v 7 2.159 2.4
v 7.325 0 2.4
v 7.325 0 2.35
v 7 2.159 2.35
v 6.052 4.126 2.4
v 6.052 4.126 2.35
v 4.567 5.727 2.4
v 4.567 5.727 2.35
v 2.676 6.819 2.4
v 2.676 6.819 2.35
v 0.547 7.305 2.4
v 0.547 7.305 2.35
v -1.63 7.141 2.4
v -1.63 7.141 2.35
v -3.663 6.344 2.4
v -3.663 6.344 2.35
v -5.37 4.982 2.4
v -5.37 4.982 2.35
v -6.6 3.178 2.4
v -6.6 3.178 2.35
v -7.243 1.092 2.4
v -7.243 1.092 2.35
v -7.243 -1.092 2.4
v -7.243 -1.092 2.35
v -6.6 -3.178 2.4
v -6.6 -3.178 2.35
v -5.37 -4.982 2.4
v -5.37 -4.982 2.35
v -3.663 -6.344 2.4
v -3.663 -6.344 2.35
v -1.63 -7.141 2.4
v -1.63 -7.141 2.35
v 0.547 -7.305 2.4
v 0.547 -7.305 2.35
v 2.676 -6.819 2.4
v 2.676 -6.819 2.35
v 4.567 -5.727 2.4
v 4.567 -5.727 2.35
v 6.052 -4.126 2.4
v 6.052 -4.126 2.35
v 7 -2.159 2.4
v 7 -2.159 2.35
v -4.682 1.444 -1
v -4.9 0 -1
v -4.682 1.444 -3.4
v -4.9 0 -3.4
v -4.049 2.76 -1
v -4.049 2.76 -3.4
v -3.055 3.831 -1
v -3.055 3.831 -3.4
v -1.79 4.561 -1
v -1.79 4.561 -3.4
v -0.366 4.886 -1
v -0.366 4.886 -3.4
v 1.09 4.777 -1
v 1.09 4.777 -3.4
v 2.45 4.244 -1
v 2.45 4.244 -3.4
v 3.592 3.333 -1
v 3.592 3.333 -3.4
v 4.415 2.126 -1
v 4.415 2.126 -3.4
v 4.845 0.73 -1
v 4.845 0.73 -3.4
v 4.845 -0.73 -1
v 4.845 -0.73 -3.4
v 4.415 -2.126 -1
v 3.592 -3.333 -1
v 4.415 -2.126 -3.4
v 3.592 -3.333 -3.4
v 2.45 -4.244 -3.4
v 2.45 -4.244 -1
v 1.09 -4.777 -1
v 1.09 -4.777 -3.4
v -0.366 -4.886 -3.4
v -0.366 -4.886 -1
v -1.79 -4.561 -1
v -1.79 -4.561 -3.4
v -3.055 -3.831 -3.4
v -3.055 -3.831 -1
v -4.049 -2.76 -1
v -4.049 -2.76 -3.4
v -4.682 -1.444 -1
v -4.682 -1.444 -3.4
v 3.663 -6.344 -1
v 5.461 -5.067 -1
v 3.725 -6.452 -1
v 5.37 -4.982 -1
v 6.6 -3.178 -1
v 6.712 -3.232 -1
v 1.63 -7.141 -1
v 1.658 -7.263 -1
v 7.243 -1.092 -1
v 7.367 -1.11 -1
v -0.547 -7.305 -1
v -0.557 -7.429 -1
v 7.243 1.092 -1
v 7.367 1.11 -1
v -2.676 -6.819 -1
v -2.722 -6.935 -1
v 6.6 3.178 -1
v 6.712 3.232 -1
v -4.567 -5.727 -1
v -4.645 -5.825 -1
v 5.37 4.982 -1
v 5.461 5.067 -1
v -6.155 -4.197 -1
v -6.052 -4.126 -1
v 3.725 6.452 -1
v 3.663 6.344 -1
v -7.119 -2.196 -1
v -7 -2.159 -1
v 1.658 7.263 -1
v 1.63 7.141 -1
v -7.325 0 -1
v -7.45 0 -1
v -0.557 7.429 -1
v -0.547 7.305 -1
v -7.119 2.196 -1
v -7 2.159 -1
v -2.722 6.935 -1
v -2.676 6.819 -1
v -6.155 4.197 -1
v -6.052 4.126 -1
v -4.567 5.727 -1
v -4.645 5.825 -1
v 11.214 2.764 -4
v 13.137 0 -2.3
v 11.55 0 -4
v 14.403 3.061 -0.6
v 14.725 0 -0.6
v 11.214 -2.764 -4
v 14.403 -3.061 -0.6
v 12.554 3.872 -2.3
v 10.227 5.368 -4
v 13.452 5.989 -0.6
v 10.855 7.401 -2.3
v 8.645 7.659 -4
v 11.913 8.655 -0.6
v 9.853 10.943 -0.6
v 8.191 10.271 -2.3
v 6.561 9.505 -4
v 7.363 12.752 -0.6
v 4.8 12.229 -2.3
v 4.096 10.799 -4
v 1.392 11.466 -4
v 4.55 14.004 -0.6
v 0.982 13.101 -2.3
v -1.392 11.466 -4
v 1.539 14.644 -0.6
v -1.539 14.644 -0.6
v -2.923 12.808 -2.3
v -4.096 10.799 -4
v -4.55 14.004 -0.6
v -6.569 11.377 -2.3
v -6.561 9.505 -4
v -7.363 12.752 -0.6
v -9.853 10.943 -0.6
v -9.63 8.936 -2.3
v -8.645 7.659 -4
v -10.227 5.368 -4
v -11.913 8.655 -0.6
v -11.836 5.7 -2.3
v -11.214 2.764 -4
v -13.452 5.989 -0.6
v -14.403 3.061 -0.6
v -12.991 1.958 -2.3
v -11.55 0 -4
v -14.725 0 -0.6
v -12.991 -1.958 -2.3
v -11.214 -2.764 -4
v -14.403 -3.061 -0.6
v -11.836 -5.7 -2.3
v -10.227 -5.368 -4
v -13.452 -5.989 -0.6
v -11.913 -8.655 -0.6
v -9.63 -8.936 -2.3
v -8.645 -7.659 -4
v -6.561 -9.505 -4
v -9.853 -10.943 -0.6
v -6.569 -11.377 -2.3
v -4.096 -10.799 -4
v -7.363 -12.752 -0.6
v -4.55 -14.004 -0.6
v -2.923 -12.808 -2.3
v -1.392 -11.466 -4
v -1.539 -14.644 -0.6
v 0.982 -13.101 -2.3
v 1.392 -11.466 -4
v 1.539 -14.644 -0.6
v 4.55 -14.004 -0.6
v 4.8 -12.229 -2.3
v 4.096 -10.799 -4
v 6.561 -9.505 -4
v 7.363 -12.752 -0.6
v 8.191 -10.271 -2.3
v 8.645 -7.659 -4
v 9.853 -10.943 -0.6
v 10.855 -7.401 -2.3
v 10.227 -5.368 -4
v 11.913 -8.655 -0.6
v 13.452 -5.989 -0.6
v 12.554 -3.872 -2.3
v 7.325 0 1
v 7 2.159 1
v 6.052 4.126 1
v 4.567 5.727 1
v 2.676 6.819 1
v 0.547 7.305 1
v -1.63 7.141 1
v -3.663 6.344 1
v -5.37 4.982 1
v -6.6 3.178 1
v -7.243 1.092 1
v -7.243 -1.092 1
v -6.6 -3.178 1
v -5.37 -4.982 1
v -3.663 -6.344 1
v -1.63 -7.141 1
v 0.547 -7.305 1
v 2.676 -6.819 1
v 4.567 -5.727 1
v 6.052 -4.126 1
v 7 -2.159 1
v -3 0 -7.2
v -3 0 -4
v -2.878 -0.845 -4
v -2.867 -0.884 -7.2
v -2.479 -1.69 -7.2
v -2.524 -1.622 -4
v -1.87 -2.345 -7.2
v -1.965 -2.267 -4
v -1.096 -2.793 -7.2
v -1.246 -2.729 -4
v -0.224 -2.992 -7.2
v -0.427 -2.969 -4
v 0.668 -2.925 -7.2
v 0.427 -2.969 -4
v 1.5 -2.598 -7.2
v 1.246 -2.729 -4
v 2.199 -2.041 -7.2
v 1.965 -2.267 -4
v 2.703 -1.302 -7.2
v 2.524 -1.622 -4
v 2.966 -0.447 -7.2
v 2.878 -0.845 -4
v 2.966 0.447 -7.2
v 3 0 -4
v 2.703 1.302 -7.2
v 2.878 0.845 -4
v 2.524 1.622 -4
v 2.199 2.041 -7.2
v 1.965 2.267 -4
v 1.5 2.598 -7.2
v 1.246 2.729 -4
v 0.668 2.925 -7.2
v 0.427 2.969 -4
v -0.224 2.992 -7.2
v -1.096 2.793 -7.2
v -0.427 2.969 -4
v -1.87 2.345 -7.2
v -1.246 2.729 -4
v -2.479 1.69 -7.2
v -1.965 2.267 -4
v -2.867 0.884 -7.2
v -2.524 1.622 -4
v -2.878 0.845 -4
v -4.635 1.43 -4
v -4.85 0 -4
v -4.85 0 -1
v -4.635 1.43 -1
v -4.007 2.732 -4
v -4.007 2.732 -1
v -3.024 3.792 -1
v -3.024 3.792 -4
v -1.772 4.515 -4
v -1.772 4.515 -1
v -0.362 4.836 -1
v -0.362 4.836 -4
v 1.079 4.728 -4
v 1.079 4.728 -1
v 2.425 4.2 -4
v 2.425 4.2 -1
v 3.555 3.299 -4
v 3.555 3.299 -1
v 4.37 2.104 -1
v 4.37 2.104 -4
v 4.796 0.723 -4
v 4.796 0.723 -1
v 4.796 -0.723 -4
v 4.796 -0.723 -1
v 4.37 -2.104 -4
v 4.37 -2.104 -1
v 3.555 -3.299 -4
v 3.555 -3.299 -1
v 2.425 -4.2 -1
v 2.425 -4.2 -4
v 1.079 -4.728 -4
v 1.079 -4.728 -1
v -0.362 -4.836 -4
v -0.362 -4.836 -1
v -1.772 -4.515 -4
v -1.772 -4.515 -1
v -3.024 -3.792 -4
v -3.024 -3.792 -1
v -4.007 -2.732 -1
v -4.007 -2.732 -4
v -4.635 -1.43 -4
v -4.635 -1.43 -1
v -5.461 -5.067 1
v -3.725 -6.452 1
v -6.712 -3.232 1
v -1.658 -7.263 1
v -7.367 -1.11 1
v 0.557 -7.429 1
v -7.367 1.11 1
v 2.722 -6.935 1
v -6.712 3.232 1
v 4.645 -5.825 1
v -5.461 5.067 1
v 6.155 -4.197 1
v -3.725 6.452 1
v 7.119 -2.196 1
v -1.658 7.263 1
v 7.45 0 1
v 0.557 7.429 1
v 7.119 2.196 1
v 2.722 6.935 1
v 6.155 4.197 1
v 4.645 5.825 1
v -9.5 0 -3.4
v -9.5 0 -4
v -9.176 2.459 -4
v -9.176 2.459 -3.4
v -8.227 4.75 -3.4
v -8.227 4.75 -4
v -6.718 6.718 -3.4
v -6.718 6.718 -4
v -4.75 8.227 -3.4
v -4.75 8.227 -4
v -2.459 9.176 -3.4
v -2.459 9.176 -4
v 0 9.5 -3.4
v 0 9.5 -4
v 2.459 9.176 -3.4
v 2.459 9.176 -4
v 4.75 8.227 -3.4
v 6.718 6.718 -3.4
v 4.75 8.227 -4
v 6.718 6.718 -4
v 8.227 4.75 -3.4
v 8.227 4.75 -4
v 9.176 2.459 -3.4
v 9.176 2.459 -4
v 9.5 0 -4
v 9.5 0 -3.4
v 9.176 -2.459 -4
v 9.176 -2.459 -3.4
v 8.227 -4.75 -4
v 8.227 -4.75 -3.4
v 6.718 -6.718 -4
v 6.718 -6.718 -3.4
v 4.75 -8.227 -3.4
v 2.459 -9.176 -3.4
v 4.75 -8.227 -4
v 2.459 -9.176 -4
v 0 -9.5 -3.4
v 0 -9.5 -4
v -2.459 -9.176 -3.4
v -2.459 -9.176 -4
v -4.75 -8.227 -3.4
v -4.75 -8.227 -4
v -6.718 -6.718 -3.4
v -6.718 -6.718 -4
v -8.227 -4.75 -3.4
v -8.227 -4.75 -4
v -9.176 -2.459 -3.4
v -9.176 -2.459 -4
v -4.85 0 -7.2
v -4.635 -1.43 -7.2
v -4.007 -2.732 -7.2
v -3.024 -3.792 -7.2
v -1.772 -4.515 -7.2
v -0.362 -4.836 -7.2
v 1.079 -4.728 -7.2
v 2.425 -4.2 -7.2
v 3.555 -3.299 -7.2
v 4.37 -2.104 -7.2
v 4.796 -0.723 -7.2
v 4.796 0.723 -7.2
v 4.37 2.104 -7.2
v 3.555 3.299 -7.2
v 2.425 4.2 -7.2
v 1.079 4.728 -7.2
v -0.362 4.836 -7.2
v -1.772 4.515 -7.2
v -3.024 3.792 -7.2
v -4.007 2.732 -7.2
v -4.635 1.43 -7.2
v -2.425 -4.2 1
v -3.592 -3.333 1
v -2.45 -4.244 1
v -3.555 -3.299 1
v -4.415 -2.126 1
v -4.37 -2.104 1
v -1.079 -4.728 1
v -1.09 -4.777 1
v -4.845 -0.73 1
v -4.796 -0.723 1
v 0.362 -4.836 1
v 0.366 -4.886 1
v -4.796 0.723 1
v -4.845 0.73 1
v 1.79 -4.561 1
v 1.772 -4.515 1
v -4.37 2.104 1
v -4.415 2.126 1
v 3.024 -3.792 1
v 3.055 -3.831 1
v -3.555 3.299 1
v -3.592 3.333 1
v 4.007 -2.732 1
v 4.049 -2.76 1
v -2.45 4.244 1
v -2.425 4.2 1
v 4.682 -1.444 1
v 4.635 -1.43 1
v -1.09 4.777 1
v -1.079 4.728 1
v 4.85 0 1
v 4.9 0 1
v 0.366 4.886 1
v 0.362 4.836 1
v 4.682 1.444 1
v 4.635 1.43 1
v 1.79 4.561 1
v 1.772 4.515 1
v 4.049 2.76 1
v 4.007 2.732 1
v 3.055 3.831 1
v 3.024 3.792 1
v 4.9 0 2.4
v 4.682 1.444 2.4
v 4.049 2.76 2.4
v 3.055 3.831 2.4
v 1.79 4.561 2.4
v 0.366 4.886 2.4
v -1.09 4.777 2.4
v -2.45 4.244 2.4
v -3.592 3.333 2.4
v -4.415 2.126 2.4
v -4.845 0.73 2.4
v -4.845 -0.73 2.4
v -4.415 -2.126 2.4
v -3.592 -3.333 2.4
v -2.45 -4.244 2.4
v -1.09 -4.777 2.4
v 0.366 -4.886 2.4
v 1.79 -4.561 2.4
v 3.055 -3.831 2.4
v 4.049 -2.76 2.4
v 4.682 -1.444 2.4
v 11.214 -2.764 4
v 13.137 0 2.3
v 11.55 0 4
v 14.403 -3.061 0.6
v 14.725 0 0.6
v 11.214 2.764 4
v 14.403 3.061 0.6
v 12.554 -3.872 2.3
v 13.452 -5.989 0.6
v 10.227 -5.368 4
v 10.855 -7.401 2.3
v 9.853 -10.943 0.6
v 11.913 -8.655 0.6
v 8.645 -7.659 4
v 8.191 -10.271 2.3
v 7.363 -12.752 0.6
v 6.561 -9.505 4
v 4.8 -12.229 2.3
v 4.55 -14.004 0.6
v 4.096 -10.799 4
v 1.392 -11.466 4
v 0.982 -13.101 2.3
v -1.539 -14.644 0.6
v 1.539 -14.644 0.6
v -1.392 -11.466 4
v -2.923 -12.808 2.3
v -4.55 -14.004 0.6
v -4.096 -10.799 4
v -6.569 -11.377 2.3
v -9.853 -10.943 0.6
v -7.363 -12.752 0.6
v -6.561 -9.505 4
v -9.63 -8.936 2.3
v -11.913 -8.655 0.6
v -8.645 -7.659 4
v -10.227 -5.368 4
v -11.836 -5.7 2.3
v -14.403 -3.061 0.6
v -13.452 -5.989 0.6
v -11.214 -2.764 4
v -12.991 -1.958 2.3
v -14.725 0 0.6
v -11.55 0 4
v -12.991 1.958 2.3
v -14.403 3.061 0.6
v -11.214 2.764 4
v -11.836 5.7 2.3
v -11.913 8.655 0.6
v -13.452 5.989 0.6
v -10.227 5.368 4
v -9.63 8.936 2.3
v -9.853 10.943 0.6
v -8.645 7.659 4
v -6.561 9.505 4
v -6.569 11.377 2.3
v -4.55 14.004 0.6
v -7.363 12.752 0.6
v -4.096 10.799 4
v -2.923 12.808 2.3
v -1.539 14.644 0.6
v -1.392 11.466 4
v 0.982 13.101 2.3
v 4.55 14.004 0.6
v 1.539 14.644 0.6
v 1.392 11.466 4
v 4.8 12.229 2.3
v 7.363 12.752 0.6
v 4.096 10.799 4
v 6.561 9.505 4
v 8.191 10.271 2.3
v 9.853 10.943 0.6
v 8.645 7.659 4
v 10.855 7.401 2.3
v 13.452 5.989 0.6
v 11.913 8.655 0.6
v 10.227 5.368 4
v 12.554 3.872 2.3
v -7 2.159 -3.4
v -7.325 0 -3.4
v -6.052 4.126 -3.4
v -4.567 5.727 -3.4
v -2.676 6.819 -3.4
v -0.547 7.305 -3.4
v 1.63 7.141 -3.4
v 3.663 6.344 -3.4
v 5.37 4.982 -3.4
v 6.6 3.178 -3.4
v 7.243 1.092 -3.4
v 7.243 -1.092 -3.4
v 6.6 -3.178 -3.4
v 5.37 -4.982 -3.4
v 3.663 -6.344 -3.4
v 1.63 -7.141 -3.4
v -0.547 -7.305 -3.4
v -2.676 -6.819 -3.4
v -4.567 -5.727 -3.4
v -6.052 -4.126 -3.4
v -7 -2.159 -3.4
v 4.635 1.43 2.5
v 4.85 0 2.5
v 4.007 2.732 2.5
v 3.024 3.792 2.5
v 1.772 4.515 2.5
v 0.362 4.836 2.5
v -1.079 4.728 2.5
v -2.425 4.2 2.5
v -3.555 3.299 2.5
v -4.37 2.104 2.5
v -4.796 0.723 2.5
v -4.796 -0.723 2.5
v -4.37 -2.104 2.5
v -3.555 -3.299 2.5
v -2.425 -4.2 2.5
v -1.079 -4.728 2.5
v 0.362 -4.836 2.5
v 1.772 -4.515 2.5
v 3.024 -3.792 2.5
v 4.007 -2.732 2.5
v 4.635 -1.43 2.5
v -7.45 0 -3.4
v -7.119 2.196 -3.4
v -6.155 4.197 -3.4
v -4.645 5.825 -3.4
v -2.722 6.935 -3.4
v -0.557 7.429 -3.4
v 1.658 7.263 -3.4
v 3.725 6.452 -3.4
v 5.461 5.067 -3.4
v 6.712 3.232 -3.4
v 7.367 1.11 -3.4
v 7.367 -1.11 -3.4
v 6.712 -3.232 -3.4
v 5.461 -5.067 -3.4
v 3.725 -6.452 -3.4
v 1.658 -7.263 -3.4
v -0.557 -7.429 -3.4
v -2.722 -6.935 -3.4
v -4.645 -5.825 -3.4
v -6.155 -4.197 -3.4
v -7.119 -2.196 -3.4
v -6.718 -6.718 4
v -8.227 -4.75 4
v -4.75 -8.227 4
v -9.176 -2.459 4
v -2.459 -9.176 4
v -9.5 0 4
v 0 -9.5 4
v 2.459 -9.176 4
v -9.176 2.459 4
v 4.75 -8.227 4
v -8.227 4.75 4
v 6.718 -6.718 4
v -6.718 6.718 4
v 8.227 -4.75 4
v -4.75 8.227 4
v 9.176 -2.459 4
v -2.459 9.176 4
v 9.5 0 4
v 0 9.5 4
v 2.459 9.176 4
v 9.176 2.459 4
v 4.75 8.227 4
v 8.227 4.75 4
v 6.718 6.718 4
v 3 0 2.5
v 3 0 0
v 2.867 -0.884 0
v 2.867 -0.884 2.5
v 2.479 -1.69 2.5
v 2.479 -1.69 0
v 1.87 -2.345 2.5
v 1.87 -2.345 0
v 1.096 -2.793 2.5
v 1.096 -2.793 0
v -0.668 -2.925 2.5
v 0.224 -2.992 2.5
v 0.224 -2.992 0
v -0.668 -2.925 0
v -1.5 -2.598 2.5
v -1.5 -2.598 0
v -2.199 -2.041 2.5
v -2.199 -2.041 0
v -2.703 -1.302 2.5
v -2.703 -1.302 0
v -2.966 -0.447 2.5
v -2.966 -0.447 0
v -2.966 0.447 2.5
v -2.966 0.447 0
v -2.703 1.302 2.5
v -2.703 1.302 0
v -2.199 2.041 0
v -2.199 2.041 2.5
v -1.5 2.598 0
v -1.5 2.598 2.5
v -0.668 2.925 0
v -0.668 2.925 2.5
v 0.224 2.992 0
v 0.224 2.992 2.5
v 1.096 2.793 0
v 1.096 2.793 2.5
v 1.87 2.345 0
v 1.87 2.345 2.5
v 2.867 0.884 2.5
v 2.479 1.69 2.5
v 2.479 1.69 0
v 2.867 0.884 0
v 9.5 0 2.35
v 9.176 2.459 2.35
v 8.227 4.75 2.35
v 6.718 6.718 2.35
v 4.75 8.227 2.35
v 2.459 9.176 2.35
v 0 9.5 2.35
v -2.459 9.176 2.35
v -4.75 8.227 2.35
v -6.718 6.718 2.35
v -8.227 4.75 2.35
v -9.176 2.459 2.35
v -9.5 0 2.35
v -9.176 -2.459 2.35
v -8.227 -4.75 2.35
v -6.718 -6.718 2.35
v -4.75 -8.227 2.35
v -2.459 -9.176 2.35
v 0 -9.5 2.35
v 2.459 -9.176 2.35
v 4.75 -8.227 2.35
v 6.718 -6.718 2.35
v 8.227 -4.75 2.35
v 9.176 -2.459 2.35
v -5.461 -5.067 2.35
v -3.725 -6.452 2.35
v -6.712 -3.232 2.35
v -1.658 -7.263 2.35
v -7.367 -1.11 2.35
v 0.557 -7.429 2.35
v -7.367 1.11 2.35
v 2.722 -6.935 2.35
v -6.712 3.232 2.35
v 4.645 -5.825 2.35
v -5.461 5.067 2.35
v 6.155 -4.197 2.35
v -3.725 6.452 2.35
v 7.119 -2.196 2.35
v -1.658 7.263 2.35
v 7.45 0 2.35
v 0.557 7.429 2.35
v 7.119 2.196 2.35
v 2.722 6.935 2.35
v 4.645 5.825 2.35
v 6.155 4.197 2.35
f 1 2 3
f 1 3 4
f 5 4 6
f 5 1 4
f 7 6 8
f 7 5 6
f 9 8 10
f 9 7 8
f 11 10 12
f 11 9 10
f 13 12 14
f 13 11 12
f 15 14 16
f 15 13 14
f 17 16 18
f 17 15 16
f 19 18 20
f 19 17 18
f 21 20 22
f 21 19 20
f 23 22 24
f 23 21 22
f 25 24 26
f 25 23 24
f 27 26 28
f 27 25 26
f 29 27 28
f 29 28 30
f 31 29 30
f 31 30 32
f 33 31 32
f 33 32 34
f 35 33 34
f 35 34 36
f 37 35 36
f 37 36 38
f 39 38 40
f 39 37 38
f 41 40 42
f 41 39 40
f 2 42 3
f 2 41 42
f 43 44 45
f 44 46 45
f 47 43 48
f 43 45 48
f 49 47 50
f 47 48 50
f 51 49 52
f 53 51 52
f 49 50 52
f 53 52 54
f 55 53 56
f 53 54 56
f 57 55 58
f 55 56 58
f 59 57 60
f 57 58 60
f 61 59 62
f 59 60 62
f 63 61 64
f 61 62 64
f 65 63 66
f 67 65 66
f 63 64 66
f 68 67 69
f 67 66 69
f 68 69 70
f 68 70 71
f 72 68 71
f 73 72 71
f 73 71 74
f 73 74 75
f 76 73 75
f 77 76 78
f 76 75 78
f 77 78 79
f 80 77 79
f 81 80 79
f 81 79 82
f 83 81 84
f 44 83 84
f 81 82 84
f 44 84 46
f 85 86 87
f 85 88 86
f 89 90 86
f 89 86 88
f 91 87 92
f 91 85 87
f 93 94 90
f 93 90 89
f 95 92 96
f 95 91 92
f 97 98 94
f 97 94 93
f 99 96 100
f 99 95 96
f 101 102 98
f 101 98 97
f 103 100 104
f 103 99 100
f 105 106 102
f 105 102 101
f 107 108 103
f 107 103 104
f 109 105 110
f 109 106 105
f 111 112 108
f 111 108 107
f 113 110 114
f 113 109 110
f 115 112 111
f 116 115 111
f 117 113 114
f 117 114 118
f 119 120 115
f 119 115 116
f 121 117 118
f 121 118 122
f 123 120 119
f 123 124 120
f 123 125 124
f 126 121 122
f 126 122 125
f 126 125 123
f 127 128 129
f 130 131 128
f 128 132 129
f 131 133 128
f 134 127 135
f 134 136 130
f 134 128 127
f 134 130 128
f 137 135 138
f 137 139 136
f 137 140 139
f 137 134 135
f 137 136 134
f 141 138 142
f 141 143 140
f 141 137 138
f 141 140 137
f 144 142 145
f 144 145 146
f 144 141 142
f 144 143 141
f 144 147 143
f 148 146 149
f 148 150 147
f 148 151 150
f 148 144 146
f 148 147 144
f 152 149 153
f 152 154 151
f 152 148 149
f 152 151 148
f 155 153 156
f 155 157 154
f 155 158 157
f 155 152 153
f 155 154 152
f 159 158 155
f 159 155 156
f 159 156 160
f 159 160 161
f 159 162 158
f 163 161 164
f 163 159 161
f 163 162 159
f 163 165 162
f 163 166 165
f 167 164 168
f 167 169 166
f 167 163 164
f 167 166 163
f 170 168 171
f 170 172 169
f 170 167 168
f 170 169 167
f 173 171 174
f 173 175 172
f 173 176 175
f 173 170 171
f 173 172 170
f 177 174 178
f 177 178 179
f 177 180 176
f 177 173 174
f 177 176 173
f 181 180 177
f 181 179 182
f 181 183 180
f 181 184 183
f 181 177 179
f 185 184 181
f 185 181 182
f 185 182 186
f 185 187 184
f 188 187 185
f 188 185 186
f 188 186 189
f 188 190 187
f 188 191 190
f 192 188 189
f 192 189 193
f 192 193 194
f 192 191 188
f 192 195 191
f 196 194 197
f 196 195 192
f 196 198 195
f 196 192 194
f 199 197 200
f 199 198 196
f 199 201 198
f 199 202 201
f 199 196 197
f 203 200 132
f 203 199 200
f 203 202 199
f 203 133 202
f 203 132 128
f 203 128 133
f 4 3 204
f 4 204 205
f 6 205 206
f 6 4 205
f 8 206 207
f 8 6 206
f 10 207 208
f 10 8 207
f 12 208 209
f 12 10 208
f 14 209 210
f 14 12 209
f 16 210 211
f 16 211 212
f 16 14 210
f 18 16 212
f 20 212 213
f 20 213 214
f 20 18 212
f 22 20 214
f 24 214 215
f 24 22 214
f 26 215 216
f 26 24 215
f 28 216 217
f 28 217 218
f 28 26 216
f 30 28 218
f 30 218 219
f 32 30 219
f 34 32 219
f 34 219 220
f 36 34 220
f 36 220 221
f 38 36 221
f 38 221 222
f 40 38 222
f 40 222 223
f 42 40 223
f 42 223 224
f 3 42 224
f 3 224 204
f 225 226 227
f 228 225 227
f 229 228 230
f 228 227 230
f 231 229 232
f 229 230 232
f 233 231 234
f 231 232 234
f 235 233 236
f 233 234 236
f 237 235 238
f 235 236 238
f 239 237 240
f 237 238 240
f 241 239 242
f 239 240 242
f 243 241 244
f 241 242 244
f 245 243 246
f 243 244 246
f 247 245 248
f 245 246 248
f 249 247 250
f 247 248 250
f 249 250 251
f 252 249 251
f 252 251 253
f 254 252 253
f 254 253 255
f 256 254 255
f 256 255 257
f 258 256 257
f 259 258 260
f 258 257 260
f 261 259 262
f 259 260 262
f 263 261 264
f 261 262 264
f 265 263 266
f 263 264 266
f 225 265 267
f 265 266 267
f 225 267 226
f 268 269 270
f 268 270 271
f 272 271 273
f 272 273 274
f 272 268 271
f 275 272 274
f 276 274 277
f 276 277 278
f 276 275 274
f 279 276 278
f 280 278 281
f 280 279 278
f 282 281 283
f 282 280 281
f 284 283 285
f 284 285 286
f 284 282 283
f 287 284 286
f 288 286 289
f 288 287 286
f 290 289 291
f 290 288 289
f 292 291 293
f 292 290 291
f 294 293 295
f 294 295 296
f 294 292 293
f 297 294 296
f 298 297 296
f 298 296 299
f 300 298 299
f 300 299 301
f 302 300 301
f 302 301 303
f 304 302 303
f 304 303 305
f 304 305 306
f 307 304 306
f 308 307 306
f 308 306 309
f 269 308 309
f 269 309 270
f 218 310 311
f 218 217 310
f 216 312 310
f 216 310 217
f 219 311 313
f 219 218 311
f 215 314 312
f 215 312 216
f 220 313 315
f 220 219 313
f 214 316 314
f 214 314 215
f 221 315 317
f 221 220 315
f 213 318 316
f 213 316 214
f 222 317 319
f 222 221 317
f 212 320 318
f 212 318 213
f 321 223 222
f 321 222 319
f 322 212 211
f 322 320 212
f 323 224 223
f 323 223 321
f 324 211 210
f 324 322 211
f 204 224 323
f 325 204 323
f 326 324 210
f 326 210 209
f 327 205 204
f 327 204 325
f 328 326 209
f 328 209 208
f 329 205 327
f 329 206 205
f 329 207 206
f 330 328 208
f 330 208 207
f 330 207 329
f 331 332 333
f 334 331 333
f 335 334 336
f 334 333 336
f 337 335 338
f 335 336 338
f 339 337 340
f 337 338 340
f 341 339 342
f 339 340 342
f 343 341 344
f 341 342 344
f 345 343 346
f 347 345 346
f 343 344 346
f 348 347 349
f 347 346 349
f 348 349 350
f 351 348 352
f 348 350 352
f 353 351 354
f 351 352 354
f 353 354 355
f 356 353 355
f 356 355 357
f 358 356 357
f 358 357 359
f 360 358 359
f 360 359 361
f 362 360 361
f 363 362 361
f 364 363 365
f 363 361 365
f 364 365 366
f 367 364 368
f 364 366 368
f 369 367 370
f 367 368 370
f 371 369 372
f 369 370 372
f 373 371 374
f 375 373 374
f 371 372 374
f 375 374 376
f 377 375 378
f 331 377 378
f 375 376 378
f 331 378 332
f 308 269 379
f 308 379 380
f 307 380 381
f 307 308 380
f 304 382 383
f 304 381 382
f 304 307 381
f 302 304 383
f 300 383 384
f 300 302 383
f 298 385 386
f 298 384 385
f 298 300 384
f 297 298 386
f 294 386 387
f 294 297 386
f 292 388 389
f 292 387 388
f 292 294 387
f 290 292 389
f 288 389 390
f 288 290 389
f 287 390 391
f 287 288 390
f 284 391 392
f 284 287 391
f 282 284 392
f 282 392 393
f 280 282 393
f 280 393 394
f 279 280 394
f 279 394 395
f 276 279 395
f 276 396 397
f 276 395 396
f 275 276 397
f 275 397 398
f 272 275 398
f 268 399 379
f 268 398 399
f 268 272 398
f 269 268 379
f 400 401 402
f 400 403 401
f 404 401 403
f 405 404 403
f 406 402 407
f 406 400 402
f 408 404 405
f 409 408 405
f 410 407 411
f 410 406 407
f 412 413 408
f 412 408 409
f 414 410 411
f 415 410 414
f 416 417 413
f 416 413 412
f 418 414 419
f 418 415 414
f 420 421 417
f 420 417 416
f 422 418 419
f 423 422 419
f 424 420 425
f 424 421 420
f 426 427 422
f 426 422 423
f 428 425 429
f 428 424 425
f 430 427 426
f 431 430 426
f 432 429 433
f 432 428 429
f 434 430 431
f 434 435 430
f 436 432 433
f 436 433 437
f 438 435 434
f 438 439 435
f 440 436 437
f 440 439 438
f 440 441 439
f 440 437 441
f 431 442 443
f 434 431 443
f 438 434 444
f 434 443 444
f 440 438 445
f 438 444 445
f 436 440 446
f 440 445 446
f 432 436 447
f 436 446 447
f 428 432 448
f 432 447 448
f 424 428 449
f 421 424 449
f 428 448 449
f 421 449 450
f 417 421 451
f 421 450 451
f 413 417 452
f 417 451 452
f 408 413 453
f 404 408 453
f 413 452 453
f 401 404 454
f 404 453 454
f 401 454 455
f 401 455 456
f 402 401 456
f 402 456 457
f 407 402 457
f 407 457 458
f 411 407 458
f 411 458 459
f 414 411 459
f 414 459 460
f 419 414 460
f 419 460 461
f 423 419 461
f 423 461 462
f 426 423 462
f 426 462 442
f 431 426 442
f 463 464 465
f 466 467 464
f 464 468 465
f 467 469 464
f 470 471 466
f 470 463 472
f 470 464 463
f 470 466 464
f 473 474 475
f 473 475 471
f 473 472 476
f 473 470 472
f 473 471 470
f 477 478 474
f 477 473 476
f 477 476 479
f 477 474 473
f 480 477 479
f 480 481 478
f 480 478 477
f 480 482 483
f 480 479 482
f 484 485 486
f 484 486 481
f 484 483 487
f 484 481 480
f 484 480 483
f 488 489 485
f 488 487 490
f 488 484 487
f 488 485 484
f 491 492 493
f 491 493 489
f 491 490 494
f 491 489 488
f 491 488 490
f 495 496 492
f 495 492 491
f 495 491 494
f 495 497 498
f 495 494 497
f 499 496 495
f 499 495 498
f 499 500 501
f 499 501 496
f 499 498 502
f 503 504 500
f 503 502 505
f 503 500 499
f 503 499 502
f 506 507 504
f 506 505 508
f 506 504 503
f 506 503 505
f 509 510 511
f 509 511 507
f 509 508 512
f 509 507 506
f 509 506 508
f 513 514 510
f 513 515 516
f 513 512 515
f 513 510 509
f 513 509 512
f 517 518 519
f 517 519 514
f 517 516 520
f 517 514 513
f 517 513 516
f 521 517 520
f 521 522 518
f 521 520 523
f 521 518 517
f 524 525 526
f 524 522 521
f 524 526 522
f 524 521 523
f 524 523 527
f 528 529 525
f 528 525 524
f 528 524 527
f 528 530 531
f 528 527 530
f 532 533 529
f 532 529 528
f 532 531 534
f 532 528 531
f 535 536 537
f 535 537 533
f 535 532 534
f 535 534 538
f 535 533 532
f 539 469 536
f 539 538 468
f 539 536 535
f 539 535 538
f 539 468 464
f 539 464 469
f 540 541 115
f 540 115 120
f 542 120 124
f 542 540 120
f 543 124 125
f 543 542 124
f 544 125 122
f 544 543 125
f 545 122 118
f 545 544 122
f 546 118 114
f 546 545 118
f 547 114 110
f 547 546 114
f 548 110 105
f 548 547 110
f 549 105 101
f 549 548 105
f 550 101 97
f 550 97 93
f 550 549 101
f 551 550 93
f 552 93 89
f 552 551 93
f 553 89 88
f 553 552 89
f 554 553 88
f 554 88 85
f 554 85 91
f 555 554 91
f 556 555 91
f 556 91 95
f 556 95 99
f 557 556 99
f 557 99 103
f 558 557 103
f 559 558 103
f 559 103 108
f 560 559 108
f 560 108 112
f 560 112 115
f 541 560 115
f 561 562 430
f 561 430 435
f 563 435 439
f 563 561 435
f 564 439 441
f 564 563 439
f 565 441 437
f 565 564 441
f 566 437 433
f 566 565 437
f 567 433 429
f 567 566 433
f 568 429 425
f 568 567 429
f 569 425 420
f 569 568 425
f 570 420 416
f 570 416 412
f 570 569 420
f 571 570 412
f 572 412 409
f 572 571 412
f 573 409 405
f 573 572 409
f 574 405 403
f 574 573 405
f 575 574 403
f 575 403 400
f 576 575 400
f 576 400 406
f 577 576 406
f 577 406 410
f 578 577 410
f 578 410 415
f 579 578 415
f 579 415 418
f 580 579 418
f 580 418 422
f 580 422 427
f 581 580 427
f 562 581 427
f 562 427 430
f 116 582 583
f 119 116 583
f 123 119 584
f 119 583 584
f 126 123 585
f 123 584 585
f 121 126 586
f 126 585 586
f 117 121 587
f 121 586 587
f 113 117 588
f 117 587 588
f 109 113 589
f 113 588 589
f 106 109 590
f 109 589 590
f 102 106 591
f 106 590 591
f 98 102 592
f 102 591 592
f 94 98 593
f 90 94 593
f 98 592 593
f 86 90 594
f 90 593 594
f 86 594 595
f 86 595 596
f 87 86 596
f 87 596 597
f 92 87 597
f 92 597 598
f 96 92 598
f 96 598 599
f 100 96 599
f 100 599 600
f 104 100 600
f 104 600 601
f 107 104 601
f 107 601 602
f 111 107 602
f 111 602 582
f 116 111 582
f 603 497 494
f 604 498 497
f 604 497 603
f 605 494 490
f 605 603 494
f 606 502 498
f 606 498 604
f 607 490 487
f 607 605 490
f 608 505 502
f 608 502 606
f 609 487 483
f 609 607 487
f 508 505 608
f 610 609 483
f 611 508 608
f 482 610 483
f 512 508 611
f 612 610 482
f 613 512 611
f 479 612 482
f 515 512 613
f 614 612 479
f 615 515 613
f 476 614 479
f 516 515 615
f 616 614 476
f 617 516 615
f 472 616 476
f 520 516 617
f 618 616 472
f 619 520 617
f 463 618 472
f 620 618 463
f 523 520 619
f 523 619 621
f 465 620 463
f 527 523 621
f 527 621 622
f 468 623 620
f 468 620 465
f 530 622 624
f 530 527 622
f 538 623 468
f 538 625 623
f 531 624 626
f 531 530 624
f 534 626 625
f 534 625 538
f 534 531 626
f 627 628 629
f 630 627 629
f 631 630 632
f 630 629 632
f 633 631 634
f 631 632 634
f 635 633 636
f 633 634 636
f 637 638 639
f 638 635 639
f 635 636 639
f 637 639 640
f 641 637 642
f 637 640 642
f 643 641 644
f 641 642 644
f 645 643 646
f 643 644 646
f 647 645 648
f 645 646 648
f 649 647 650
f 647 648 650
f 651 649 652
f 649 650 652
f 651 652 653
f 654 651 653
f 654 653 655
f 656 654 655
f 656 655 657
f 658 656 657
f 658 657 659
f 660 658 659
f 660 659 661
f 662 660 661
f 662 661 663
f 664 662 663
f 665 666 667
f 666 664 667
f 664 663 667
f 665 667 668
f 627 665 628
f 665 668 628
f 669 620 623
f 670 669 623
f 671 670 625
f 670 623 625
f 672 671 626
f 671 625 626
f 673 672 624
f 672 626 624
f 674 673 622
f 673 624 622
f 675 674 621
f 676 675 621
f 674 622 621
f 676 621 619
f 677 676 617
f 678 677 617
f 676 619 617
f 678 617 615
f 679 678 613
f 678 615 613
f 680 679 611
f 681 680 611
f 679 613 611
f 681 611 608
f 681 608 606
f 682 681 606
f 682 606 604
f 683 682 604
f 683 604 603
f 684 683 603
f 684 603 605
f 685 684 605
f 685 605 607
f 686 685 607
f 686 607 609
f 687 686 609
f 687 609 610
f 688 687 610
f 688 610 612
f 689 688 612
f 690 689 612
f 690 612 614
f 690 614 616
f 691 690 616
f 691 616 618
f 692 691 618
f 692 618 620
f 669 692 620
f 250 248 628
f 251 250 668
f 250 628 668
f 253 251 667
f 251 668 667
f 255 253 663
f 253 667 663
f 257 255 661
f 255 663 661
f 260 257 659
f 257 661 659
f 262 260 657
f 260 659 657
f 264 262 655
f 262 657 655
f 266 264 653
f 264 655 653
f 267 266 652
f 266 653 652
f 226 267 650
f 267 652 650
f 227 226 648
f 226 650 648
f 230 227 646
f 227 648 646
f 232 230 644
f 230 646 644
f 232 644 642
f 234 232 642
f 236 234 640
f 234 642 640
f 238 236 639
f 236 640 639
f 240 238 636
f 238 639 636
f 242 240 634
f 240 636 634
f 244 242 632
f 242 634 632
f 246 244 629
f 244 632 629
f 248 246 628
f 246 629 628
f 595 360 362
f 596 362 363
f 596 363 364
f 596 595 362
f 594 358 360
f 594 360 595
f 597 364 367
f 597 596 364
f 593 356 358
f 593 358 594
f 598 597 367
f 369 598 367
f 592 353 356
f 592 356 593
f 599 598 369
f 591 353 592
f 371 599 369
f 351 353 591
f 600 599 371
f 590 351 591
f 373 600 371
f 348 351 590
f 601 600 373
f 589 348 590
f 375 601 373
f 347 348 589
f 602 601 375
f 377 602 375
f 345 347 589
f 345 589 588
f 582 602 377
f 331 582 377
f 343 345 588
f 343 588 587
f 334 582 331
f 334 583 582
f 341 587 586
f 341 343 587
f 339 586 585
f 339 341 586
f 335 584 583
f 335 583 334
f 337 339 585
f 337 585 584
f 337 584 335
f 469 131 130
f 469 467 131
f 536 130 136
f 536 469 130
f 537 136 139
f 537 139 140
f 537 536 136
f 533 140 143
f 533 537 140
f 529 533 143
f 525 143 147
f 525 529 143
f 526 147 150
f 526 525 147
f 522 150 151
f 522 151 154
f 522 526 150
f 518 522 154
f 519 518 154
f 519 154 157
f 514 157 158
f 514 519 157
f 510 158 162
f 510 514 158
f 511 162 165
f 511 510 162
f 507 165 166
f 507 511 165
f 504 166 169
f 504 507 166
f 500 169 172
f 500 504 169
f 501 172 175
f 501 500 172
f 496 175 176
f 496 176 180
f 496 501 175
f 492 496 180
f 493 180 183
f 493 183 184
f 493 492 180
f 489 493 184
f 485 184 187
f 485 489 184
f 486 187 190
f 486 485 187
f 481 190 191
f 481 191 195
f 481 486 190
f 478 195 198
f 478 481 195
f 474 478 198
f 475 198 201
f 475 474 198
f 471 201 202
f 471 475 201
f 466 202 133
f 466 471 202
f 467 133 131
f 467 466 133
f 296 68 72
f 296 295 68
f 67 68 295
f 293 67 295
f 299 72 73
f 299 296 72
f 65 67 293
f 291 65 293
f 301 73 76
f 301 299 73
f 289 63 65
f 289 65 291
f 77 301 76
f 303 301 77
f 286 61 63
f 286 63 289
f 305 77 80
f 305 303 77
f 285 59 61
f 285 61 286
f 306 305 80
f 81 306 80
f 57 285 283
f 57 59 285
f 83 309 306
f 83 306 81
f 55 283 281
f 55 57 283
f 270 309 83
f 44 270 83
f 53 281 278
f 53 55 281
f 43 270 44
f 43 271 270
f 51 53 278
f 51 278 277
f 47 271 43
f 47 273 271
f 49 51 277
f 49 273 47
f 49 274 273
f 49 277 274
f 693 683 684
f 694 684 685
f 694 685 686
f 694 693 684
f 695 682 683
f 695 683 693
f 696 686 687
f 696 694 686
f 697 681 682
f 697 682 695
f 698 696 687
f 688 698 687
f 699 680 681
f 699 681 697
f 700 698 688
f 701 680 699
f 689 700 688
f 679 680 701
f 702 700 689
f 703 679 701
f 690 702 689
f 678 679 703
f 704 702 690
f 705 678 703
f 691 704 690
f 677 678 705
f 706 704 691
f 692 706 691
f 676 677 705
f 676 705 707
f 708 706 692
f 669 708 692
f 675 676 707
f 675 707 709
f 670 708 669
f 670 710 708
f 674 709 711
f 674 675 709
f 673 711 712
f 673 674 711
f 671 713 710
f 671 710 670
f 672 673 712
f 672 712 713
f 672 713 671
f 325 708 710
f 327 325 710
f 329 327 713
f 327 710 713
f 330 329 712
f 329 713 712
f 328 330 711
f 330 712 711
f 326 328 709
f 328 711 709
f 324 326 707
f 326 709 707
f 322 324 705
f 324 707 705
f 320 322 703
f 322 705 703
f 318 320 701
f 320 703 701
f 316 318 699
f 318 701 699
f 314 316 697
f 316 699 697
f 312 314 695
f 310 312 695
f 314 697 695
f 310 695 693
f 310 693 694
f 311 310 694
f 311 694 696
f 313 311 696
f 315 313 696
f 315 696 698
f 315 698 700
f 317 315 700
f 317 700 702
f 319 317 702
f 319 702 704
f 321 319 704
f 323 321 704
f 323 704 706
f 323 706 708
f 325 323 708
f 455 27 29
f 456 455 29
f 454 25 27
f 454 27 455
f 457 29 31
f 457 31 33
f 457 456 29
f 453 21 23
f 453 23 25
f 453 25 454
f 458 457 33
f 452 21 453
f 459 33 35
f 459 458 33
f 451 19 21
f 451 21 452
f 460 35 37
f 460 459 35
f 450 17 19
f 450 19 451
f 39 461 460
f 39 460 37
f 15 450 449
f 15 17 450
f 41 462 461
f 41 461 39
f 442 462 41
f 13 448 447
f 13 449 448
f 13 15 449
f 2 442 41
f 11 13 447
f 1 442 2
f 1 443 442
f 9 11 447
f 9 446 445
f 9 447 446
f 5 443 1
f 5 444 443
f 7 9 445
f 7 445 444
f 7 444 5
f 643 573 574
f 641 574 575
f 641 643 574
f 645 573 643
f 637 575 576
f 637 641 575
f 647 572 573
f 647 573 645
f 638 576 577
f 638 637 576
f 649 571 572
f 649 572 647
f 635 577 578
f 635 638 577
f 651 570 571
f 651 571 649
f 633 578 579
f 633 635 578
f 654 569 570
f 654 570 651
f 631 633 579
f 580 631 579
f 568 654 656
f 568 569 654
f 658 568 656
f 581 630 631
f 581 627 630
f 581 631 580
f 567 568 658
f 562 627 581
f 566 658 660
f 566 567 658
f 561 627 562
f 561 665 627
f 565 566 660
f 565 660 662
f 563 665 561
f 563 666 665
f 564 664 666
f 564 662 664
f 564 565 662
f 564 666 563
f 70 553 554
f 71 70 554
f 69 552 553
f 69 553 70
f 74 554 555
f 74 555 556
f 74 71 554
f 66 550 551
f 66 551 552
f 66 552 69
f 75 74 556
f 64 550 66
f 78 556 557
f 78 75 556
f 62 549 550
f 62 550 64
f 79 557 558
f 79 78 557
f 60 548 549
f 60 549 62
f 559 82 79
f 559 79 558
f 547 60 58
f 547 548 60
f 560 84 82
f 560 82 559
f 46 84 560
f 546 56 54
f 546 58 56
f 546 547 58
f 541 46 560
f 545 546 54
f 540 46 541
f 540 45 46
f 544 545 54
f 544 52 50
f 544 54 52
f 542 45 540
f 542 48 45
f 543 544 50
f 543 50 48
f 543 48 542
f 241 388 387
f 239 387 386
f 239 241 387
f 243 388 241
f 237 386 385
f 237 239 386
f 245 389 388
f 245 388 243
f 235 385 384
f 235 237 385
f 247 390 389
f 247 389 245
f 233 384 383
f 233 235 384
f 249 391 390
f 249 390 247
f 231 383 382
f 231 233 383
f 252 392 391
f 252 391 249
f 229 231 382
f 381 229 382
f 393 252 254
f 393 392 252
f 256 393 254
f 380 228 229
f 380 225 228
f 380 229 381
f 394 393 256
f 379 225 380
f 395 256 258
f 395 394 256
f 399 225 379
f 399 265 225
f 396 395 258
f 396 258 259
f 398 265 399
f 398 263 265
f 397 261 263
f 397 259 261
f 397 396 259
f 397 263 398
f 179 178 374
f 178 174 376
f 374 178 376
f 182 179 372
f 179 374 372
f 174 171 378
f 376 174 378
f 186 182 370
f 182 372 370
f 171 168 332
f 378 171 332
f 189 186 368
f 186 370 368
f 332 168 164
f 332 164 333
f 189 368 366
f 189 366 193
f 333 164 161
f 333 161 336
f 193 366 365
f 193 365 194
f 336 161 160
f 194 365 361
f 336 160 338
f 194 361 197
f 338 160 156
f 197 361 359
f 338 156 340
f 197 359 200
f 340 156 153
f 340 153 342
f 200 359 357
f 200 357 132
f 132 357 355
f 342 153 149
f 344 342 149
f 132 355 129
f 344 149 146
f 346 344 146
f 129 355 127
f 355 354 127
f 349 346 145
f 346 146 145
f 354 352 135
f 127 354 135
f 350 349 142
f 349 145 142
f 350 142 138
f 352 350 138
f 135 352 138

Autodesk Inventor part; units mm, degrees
ref_plane "YZ Plane" through (0, 0, 0) normal (1, 0, 0) x (0, 1, 0)
ref_plane "XZ Plane" through (0, 0, 0) normal (0, 1, 0) x (-1, 0, 0)
ref_plane "XY Plane" through (0, 0, 0) normal (0, 0, 1) x (1, 0, 0)
sketch "Skizze1" plane through (0, 0, 0) normal (0, 0, 1) x (1, 0, 0)
  circle A0 centre (0, 0) radius 3
  circle A1 centre (0, 0) radius 14.725
  dimension "d0" = 6
  dimension "d1" = 29.45
extrude "Extrusion1" add sketch "Skizze1" along normal mid plane 8
sketch "Skizze2" plane through (0, 0, 4) normal (0, 0, 1) x (1, 0, 0)
  circle A0 centre (0, 0) radius 3 projected
  circle A1 centre (0, 0) radius 14.725 projected
  circle A2 centre (0, 0) radius 4.85
  circle A3 centre (0, 0) radius 4.9
  circle A4 centre (0, 0) radius 7.325
  circle A5 centre (0, 0) radius 9.5
  circle A6 centre (0, 0) radius 7.45
  dimension "d4" = 9.7
  dimension "d5" = 9.8
  dimension "d6" = 14.65
  dimension "d7" = 19
  dimension "d16" = 14.9
extrude "Extrusion2" cut sketch "Skizze2" against normal blind 1.5 contours A2
extrude "Extrusion3" cut sketch "Skizze2" against normal blind 1.6 contours A4
extrude "Extrusion4" cut sketch "Skizze2" against normal blind 1.65 contours A5 | A6
extrude "Extrusion5" cut sketch "Skizze2" against normal blind 3 contours A3
extrude "Extrusion6" cut sketch "Skizze2" against normal blind 3 contours A6
sketch "Skizze4" plane through (0, 0, -4) normal (0, 0, -1) x (-1, 0, 0)
  circle A0 centre (0, 0) radius 3 projected
  circle A1 centre (0, 0) radius 14.725 projected
  circle A2 centre (0, 0) radius 4.9 projected
  circle A3 centre (0, 0) radius 7.45 projected
  circle A4 centre (0, 0) radius 7.325 projected
  circle A5 centre (0, 0) radius 9.5 projected
  circle A6 centre (0, 0) radius 4.85 projected
extrude "Extrusion7" add sketch "Skizze4" along normal blind 3.2 contours A6
extrude "Extrusion8" cut sketch "Skizze4" against normal blind 3 contours A2
extrude "Extrusion9" cut sketch "Skizze4" against normal blind 0.6 contours A4
extrude "Extrusion10" cut sketch "Skizze4" against normal blind 3 contours A3
extrude "Extrusion11" cut sketch "Skizze4" against normal blind 0.6 contours A5
chamfer "Fase1" distance 3.175 distance2 3.4 1 edges at (-14.725, 0, -4)
chamfer "Fase2" distance 3.175 distance2 3.4 1 edges at (-14.725, 0, 4) measured on face at (12.7487, -1.9325, 4)
properties part number "Mauro_White_Wheel"
